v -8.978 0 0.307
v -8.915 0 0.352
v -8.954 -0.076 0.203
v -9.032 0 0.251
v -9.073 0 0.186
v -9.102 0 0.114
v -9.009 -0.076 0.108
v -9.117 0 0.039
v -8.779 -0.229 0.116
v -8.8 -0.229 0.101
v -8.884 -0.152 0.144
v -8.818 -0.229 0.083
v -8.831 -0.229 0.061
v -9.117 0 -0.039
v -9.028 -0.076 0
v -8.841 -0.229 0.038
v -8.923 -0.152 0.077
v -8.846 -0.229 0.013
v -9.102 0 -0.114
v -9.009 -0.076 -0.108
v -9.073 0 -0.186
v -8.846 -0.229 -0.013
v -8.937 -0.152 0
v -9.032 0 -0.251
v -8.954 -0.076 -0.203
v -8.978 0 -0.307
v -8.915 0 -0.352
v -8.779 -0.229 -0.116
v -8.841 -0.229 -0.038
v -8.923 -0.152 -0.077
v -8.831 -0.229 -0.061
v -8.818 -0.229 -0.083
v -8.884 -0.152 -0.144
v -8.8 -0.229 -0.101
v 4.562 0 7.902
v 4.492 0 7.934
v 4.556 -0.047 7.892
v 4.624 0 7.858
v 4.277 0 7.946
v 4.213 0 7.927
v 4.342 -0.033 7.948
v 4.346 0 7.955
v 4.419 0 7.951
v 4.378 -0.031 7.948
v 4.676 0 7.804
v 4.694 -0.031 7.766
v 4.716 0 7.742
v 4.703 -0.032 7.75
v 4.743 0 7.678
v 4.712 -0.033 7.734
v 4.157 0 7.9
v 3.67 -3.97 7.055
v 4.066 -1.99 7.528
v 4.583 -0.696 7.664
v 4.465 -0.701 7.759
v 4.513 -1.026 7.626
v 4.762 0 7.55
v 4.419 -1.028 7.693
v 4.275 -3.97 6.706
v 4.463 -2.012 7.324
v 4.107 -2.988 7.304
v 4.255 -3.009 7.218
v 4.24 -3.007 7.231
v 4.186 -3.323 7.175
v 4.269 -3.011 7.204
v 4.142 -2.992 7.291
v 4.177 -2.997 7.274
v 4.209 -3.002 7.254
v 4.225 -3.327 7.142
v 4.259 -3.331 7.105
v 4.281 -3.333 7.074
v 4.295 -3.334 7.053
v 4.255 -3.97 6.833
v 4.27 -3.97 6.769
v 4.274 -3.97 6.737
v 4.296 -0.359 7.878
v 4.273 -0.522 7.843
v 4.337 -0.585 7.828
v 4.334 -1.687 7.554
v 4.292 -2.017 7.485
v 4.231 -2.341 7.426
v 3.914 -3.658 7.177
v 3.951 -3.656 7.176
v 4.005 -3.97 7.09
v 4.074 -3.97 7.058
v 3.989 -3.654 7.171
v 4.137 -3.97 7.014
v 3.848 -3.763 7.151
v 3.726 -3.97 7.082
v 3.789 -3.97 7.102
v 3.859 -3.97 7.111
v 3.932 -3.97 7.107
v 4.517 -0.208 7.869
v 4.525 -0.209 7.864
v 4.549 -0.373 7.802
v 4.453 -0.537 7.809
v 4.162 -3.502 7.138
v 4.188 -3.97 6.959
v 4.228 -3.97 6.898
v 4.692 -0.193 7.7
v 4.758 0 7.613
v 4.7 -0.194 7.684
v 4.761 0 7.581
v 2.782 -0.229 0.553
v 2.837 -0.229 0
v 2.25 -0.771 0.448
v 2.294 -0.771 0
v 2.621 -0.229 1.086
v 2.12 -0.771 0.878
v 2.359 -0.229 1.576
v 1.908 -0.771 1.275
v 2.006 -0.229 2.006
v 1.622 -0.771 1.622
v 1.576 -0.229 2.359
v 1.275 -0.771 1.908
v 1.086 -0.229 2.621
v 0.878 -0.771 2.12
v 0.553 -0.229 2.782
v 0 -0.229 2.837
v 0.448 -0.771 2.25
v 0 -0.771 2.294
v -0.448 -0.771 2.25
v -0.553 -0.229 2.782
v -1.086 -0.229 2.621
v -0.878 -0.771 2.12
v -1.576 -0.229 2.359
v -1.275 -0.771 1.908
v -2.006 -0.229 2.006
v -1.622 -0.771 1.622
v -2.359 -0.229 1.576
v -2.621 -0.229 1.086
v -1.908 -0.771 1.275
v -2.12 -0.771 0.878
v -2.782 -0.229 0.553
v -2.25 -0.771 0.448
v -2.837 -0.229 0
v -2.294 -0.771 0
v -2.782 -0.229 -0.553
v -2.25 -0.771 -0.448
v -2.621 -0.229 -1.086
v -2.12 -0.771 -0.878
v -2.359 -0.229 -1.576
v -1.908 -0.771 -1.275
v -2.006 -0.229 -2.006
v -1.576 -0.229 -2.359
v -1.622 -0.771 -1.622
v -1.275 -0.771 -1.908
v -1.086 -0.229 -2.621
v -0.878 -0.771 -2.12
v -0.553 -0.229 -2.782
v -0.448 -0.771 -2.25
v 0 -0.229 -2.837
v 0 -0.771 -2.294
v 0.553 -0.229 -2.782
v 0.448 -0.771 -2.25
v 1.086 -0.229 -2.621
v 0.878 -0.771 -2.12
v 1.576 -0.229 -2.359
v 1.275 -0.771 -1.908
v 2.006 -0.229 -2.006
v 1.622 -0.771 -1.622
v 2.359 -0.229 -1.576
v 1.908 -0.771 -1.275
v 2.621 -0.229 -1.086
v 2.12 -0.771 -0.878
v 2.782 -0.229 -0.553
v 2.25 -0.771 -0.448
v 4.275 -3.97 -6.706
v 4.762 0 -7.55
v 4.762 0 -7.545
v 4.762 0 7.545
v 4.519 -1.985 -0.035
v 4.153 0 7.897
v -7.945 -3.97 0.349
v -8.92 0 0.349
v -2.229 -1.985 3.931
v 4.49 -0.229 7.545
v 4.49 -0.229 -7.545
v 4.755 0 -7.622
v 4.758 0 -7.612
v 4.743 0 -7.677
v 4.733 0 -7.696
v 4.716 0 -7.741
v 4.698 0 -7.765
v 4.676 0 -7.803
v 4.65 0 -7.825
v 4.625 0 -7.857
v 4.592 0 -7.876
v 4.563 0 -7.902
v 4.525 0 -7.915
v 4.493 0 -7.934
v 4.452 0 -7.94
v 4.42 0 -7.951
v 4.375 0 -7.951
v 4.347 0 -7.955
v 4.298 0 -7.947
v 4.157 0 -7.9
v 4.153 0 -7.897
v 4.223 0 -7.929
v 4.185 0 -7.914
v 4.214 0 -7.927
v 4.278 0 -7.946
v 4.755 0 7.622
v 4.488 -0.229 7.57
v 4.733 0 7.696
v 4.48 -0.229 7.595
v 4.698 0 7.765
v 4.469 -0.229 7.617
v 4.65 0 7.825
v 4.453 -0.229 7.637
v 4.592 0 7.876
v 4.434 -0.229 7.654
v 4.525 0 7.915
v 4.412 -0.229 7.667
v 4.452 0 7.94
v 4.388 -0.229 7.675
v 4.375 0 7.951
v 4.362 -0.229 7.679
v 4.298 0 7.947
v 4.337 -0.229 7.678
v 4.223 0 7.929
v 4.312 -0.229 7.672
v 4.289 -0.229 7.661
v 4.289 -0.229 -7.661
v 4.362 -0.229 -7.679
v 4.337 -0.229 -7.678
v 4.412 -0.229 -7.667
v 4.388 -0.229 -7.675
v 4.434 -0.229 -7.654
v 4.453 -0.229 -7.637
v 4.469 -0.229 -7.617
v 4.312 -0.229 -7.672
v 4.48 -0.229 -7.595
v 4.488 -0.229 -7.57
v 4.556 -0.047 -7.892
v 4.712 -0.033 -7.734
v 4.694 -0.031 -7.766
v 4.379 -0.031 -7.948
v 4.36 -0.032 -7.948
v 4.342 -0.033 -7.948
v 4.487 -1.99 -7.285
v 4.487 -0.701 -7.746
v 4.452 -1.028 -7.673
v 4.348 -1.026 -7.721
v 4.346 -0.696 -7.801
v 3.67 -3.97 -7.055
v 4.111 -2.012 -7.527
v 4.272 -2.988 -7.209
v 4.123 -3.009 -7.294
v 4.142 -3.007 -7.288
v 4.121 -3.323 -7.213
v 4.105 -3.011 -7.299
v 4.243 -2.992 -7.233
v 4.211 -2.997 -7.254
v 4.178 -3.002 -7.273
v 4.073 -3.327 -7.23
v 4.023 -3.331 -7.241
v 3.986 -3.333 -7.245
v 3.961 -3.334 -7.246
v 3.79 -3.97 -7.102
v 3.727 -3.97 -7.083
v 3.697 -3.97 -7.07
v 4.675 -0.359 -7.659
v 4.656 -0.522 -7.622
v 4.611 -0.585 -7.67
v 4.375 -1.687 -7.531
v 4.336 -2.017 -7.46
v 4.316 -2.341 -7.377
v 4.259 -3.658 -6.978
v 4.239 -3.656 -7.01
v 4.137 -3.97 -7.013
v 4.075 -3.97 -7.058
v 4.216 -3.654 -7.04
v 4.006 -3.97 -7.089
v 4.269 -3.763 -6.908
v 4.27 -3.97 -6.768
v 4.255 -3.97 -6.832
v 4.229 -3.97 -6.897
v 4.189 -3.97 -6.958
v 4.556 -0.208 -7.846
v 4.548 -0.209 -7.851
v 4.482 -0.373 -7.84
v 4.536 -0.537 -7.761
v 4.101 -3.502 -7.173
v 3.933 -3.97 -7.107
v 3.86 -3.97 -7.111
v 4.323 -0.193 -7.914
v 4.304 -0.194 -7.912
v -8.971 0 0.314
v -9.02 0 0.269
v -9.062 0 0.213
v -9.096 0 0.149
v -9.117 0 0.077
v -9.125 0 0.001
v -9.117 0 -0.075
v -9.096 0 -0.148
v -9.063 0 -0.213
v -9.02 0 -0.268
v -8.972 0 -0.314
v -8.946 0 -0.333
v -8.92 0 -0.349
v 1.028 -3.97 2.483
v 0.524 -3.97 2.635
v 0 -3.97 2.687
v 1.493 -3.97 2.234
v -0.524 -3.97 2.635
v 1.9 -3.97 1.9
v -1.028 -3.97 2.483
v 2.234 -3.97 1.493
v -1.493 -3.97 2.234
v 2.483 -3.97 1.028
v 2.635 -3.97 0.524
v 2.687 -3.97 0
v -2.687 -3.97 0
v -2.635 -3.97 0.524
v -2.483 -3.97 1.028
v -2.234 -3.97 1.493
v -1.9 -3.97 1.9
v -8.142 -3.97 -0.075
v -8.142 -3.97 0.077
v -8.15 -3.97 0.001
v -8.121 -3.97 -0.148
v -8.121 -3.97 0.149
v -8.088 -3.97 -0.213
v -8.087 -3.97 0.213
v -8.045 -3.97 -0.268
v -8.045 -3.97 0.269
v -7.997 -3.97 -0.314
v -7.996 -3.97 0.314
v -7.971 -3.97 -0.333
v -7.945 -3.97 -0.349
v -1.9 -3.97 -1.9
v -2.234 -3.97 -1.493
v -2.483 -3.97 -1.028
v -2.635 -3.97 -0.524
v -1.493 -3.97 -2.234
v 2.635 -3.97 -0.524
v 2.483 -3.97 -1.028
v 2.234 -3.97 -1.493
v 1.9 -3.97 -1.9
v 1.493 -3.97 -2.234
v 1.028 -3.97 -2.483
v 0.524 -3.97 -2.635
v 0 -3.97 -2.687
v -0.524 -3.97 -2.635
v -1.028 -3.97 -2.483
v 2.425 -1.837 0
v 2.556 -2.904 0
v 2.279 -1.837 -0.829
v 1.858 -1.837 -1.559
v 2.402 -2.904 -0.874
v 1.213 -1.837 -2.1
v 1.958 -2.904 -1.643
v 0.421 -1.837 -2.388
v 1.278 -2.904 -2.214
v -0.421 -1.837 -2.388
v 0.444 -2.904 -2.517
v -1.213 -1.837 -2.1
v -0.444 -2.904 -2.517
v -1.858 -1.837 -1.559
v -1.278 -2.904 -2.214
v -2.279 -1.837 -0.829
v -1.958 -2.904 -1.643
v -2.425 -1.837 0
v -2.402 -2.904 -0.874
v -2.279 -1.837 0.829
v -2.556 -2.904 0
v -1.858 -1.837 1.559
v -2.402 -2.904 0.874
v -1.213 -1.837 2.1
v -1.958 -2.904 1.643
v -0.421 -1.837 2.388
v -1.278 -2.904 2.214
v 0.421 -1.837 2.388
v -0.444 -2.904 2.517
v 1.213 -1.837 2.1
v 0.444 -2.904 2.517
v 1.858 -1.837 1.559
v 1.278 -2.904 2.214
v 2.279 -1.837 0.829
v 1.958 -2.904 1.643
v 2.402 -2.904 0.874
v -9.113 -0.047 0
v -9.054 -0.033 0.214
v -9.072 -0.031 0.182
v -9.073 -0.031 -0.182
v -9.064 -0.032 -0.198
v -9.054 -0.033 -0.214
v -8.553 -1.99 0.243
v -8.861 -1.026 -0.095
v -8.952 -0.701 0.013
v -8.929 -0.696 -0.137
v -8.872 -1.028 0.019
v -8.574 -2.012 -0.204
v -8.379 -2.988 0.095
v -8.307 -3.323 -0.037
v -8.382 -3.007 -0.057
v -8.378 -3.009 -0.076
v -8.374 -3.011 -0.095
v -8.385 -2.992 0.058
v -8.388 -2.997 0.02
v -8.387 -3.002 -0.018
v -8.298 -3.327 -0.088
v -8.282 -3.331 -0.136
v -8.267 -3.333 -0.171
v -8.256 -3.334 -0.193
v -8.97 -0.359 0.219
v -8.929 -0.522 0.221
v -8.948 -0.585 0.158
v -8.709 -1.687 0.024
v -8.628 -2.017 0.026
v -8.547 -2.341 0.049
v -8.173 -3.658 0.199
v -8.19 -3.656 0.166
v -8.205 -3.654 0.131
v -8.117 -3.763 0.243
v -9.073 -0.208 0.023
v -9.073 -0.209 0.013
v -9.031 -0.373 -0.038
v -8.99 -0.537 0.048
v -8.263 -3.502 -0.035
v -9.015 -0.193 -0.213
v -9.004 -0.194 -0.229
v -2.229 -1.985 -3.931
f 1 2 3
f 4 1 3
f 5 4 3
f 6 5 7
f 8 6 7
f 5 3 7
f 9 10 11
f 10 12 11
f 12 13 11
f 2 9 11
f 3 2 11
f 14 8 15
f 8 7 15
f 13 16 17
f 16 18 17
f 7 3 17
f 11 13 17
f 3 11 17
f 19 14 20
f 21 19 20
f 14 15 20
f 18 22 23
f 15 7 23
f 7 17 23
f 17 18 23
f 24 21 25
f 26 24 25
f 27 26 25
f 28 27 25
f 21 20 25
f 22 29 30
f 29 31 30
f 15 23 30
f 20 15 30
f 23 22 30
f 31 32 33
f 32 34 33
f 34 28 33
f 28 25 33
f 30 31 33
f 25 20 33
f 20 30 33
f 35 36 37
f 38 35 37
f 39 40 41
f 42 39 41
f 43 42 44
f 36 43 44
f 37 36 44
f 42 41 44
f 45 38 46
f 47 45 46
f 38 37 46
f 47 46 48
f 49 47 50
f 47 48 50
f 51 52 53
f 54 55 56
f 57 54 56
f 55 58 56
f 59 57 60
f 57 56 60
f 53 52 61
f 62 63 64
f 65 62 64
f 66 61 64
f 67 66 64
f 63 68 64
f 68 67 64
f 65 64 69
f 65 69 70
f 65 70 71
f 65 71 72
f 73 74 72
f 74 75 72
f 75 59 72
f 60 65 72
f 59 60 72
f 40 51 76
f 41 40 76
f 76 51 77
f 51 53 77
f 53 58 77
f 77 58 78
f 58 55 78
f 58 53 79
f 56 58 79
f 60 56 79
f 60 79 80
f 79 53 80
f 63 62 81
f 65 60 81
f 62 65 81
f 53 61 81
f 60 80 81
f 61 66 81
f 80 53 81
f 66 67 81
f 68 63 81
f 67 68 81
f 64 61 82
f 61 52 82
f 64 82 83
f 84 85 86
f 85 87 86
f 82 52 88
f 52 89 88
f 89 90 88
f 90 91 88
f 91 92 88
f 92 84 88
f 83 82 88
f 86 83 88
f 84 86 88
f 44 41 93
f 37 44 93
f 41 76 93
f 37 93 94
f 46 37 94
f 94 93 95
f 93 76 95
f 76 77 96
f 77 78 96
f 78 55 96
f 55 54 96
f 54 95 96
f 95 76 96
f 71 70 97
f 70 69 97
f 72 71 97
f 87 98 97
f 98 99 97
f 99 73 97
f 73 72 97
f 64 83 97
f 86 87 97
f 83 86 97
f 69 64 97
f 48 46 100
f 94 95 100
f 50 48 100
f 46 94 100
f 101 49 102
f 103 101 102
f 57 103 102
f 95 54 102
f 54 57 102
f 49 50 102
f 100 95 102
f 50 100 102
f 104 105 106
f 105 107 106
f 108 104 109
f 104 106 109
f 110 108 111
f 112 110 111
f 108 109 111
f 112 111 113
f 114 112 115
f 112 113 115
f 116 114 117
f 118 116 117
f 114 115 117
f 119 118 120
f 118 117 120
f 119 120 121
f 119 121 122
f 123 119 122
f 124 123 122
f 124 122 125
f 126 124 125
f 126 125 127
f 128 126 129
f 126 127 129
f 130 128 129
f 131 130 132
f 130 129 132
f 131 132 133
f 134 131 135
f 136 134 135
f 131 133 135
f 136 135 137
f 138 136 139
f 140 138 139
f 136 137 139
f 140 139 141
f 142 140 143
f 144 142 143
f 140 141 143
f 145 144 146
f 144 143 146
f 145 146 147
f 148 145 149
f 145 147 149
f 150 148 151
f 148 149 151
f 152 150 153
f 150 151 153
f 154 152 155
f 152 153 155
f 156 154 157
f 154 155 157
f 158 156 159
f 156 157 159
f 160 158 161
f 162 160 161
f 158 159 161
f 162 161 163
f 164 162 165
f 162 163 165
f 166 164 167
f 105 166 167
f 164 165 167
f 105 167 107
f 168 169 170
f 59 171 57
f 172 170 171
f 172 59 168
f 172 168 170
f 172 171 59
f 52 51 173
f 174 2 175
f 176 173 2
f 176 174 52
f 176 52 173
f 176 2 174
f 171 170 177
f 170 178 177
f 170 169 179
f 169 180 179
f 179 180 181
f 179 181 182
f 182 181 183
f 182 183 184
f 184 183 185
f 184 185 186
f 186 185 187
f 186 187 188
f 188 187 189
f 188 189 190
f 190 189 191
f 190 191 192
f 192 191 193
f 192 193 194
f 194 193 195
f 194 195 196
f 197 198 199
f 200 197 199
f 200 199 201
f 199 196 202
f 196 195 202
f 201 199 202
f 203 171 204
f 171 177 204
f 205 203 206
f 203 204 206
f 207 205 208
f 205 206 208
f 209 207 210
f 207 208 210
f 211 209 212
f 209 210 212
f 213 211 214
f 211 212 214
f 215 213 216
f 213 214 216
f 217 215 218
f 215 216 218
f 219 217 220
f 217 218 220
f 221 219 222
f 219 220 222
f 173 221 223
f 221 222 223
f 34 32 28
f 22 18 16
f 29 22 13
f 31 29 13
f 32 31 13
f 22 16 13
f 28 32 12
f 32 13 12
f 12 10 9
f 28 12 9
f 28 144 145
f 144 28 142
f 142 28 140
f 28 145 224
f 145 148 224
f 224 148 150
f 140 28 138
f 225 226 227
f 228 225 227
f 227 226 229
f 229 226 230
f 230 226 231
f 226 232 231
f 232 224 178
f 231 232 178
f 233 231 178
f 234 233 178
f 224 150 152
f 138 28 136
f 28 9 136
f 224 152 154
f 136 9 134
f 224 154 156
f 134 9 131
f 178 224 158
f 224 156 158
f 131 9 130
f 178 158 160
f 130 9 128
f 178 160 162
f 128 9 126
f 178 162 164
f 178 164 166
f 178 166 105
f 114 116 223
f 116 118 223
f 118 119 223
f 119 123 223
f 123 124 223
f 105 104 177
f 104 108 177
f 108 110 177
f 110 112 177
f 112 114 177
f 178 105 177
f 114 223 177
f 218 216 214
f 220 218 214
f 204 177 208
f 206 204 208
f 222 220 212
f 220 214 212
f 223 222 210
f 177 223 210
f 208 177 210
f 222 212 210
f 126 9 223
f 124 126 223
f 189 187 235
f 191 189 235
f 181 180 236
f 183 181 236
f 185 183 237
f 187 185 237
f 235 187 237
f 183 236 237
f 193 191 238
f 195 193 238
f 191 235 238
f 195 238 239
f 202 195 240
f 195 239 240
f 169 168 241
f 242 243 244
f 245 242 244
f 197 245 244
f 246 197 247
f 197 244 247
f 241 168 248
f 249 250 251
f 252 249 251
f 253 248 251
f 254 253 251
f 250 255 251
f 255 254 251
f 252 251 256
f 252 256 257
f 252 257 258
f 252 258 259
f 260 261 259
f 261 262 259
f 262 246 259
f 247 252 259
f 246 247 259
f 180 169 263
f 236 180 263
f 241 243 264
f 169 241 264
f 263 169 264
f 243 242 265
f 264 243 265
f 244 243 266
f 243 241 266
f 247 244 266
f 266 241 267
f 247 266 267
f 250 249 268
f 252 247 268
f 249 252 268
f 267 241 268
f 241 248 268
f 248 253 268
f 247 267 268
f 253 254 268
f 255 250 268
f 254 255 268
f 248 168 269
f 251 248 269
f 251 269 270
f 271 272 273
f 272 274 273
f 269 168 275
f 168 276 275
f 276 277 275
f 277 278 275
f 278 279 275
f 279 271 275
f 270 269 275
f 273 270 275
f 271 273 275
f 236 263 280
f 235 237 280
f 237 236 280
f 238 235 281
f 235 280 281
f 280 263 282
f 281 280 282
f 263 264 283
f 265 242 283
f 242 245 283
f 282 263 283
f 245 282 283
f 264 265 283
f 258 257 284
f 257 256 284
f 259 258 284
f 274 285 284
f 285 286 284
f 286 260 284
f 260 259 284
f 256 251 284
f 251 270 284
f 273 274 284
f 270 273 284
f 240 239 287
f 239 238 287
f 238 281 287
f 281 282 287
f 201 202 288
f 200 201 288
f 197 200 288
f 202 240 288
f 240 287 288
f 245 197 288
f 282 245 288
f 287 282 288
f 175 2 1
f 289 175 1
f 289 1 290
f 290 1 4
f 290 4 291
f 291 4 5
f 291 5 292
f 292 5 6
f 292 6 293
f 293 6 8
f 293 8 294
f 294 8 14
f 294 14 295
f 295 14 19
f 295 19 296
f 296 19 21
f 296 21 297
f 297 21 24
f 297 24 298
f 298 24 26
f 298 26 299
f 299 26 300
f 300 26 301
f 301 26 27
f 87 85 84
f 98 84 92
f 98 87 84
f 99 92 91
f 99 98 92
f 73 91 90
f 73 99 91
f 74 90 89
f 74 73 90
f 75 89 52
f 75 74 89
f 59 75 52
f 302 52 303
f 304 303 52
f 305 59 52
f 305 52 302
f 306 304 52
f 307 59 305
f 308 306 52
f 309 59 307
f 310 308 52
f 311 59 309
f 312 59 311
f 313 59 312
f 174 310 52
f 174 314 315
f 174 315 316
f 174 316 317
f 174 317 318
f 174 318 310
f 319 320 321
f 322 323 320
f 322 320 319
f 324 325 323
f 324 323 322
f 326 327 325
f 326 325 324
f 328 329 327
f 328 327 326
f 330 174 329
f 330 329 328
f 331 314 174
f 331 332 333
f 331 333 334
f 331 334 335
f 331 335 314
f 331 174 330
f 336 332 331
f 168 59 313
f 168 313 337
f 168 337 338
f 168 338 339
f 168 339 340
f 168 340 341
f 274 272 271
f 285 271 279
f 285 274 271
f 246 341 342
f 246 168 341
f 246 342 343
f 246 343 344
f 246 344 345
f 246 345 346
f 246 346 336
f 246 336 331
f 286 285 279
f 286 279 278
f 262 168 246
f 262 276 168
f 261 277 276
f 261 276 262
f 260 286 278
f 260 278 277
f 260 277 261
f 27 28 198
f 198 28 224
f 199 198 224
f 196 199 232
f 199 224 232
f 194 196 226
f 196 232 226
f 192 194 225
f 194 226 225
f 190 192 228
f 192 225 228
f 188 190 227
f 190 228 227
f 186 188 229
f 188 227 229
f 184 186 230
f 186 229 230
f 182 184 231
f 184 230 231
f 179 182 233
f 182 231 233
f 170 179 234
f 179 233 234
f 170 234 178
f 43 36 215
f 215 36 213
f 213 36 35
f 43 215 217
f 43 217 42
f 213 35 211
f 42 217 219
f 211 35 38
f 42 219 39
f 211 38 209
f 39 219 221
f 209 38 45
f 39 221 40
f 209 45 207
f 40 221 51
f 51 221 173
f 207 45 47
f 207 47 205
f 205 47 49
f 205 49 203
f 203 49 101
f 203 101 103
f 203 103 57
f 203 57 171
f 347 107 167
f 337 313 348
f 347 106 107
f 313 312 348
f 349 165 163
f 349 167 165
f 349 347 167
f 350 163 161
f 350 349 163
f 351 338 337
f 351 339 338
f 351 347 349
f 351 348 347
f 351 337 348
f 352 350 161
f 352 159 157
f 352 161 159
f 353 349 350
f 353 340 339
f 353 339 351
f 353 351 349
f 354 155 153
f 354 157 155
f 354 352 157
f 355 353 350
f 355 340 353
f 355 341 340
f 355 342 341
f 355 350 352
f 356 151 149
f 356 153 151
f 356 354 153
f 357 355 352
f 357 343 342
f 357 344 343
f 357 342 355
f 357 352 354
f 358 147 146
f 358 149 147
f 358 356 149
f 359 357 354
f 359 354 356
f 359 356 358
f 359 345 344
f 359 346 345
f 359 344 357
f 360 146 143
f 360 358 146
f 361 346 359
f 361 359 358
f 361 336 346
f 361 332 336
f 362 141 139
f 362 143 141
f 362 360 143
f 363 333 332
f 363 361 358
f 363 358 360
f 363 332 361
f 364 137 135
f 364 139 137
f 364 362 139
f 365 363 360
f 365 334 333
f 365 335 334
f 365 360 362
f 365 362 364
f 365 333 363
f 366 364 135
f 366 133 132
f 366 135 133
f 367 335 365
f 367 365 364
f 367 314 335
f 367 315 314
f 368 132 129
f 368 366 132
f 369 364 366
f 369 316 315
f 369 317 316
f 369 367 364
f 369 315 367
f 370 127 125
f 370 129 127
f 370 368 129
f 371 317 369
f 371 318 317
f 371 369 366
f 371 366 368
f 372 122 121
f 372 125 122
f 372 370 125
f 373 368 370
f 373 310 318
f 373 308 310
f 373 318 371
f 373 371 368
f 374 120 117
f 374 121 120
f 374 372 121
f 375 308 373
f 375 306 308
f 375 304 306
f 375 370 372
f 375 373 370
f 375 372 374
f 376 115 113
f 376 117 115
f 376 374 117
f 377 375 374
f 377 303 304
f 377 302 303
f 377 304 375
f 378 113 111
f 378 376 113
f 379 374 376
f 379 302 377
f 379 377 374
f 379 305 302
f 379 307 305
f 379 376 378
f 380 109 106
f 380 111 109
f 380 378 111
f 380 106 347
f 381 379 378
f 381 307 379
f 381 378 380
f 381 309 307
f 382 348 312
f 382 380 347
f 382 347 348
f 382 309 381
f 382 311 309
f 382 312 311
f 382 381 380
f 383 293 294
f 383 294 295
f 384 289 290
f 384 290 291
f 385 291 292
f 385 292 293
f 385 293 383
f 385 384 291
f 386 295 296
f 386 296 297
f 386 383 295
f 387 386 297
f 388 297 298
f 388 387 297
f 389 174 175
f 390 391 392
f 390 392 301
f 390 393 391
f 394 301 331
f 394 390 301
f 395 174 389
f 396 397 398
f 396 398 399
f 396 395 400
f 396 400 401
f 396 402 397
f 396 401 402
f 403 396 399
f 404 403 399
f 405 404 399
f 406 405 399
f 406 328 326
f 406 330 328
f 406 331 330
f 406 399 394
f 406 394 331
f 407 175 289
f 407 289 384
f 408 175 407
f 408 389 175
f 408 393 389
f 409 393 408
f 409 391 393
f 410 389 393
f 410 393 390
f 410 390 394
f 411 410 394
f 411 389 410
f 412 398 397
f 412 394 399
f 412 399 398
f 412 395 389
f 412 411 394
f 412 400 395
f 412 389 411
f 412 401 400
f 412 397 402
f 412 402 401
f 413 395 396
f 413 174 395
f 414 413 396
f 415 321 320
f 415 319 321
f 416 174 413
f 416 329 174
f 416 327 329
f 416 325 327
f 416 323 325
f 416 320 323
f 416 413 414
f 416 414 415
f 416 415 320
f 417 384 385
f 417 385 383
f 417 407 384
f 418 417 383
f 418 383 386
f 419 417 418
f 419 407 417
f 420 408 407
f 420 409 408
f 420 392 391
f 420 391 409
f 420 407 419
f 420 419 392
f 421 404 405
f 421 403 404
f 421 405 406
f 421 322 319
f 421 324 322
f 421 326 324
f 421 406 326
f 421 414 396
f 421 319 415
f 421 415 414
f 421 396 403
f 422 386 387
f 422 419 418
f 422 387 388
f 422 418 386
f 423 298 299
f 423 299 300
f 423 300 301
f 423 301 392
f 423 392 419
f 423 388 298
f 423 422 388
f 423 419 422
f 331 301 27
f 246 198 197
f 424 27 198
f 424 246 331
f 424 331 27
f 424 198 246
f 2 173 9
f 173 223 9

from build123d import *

# Parameters (mm, degrees)
F0_R     = 2.19964
F1_DEPTH = 3.97002
F1_TAPER = 7
F2_R     = 0.4064
F3_R     = 3.065431086
F4_DEPTH = 1.27
F4_TAPER = 45
F6_DEPTH = 0.2286
F6_TAPER = 50


# Not quite as in the source:
# - a feature names something its author has since deleted; it is built from what else it names


with BuildPart() as f1:
    # F0 (on Front) → F1 (new body)
    with BuildSketch(Plane.XZ):
        Polygon((4.7625, 8.248891971), (-9.525, 0), (4.7625, -8.248891971), align=None)
        Circle(F0_R, mode=Mode.SUBTRACT)
    extrude(amount=F1_DEPTH, taper=F1_TAPER)

    # F2
    f2_edges = [f1.edges().sort_by_distance(p)[0] for p in [
        (-9.037543, -1.98501, 0),
        (4.518771, -1.98501, 7.826742),
        (4.518771, -1.98501, -7.826742),
    ]]
    fillet(f2_edges, radius=F2_R)

    # F3 (on face) → F4 (cut)
    with BuildSketch(Plane.XZ):
        Circle(F3_R)
    extrude(amount=F4_DEPTH, taper=F4_TAPER, mode=Mode.SUBTRACT)

    # F5 (on face) → F6 (cut)
    with BuildSketch(Plane.XZ):
        with BuildLine():
            ThreePointArc((4.7625, 7.5449865229), (4.5593, 7.8969392469), (4.1529, 7.8969392469))
            Line((4.1529, 7.8969392469), (-8.9154, 0.3519527241))
            ThreePointArc((-8.9154, 0.3519527241), (-9.1186, 0), (-8.9154, -0.3519527241))
            Line((-8.9154, -0.3519527241), (4.1529, -7.8969392469))
            ThreePointArc((4.1529, -7.8969392469), (4.5593, -7.8969392469), (4.7625, -7.5449865229))
            Line((4.7625, -7.5449865229), (4.7625, 7.5449865229))
        make_face()
    extrude(amount=F6_DEPTH, taper=F6_TAPER, mode=Mode.SUBTRACT)


solid = f1.part
